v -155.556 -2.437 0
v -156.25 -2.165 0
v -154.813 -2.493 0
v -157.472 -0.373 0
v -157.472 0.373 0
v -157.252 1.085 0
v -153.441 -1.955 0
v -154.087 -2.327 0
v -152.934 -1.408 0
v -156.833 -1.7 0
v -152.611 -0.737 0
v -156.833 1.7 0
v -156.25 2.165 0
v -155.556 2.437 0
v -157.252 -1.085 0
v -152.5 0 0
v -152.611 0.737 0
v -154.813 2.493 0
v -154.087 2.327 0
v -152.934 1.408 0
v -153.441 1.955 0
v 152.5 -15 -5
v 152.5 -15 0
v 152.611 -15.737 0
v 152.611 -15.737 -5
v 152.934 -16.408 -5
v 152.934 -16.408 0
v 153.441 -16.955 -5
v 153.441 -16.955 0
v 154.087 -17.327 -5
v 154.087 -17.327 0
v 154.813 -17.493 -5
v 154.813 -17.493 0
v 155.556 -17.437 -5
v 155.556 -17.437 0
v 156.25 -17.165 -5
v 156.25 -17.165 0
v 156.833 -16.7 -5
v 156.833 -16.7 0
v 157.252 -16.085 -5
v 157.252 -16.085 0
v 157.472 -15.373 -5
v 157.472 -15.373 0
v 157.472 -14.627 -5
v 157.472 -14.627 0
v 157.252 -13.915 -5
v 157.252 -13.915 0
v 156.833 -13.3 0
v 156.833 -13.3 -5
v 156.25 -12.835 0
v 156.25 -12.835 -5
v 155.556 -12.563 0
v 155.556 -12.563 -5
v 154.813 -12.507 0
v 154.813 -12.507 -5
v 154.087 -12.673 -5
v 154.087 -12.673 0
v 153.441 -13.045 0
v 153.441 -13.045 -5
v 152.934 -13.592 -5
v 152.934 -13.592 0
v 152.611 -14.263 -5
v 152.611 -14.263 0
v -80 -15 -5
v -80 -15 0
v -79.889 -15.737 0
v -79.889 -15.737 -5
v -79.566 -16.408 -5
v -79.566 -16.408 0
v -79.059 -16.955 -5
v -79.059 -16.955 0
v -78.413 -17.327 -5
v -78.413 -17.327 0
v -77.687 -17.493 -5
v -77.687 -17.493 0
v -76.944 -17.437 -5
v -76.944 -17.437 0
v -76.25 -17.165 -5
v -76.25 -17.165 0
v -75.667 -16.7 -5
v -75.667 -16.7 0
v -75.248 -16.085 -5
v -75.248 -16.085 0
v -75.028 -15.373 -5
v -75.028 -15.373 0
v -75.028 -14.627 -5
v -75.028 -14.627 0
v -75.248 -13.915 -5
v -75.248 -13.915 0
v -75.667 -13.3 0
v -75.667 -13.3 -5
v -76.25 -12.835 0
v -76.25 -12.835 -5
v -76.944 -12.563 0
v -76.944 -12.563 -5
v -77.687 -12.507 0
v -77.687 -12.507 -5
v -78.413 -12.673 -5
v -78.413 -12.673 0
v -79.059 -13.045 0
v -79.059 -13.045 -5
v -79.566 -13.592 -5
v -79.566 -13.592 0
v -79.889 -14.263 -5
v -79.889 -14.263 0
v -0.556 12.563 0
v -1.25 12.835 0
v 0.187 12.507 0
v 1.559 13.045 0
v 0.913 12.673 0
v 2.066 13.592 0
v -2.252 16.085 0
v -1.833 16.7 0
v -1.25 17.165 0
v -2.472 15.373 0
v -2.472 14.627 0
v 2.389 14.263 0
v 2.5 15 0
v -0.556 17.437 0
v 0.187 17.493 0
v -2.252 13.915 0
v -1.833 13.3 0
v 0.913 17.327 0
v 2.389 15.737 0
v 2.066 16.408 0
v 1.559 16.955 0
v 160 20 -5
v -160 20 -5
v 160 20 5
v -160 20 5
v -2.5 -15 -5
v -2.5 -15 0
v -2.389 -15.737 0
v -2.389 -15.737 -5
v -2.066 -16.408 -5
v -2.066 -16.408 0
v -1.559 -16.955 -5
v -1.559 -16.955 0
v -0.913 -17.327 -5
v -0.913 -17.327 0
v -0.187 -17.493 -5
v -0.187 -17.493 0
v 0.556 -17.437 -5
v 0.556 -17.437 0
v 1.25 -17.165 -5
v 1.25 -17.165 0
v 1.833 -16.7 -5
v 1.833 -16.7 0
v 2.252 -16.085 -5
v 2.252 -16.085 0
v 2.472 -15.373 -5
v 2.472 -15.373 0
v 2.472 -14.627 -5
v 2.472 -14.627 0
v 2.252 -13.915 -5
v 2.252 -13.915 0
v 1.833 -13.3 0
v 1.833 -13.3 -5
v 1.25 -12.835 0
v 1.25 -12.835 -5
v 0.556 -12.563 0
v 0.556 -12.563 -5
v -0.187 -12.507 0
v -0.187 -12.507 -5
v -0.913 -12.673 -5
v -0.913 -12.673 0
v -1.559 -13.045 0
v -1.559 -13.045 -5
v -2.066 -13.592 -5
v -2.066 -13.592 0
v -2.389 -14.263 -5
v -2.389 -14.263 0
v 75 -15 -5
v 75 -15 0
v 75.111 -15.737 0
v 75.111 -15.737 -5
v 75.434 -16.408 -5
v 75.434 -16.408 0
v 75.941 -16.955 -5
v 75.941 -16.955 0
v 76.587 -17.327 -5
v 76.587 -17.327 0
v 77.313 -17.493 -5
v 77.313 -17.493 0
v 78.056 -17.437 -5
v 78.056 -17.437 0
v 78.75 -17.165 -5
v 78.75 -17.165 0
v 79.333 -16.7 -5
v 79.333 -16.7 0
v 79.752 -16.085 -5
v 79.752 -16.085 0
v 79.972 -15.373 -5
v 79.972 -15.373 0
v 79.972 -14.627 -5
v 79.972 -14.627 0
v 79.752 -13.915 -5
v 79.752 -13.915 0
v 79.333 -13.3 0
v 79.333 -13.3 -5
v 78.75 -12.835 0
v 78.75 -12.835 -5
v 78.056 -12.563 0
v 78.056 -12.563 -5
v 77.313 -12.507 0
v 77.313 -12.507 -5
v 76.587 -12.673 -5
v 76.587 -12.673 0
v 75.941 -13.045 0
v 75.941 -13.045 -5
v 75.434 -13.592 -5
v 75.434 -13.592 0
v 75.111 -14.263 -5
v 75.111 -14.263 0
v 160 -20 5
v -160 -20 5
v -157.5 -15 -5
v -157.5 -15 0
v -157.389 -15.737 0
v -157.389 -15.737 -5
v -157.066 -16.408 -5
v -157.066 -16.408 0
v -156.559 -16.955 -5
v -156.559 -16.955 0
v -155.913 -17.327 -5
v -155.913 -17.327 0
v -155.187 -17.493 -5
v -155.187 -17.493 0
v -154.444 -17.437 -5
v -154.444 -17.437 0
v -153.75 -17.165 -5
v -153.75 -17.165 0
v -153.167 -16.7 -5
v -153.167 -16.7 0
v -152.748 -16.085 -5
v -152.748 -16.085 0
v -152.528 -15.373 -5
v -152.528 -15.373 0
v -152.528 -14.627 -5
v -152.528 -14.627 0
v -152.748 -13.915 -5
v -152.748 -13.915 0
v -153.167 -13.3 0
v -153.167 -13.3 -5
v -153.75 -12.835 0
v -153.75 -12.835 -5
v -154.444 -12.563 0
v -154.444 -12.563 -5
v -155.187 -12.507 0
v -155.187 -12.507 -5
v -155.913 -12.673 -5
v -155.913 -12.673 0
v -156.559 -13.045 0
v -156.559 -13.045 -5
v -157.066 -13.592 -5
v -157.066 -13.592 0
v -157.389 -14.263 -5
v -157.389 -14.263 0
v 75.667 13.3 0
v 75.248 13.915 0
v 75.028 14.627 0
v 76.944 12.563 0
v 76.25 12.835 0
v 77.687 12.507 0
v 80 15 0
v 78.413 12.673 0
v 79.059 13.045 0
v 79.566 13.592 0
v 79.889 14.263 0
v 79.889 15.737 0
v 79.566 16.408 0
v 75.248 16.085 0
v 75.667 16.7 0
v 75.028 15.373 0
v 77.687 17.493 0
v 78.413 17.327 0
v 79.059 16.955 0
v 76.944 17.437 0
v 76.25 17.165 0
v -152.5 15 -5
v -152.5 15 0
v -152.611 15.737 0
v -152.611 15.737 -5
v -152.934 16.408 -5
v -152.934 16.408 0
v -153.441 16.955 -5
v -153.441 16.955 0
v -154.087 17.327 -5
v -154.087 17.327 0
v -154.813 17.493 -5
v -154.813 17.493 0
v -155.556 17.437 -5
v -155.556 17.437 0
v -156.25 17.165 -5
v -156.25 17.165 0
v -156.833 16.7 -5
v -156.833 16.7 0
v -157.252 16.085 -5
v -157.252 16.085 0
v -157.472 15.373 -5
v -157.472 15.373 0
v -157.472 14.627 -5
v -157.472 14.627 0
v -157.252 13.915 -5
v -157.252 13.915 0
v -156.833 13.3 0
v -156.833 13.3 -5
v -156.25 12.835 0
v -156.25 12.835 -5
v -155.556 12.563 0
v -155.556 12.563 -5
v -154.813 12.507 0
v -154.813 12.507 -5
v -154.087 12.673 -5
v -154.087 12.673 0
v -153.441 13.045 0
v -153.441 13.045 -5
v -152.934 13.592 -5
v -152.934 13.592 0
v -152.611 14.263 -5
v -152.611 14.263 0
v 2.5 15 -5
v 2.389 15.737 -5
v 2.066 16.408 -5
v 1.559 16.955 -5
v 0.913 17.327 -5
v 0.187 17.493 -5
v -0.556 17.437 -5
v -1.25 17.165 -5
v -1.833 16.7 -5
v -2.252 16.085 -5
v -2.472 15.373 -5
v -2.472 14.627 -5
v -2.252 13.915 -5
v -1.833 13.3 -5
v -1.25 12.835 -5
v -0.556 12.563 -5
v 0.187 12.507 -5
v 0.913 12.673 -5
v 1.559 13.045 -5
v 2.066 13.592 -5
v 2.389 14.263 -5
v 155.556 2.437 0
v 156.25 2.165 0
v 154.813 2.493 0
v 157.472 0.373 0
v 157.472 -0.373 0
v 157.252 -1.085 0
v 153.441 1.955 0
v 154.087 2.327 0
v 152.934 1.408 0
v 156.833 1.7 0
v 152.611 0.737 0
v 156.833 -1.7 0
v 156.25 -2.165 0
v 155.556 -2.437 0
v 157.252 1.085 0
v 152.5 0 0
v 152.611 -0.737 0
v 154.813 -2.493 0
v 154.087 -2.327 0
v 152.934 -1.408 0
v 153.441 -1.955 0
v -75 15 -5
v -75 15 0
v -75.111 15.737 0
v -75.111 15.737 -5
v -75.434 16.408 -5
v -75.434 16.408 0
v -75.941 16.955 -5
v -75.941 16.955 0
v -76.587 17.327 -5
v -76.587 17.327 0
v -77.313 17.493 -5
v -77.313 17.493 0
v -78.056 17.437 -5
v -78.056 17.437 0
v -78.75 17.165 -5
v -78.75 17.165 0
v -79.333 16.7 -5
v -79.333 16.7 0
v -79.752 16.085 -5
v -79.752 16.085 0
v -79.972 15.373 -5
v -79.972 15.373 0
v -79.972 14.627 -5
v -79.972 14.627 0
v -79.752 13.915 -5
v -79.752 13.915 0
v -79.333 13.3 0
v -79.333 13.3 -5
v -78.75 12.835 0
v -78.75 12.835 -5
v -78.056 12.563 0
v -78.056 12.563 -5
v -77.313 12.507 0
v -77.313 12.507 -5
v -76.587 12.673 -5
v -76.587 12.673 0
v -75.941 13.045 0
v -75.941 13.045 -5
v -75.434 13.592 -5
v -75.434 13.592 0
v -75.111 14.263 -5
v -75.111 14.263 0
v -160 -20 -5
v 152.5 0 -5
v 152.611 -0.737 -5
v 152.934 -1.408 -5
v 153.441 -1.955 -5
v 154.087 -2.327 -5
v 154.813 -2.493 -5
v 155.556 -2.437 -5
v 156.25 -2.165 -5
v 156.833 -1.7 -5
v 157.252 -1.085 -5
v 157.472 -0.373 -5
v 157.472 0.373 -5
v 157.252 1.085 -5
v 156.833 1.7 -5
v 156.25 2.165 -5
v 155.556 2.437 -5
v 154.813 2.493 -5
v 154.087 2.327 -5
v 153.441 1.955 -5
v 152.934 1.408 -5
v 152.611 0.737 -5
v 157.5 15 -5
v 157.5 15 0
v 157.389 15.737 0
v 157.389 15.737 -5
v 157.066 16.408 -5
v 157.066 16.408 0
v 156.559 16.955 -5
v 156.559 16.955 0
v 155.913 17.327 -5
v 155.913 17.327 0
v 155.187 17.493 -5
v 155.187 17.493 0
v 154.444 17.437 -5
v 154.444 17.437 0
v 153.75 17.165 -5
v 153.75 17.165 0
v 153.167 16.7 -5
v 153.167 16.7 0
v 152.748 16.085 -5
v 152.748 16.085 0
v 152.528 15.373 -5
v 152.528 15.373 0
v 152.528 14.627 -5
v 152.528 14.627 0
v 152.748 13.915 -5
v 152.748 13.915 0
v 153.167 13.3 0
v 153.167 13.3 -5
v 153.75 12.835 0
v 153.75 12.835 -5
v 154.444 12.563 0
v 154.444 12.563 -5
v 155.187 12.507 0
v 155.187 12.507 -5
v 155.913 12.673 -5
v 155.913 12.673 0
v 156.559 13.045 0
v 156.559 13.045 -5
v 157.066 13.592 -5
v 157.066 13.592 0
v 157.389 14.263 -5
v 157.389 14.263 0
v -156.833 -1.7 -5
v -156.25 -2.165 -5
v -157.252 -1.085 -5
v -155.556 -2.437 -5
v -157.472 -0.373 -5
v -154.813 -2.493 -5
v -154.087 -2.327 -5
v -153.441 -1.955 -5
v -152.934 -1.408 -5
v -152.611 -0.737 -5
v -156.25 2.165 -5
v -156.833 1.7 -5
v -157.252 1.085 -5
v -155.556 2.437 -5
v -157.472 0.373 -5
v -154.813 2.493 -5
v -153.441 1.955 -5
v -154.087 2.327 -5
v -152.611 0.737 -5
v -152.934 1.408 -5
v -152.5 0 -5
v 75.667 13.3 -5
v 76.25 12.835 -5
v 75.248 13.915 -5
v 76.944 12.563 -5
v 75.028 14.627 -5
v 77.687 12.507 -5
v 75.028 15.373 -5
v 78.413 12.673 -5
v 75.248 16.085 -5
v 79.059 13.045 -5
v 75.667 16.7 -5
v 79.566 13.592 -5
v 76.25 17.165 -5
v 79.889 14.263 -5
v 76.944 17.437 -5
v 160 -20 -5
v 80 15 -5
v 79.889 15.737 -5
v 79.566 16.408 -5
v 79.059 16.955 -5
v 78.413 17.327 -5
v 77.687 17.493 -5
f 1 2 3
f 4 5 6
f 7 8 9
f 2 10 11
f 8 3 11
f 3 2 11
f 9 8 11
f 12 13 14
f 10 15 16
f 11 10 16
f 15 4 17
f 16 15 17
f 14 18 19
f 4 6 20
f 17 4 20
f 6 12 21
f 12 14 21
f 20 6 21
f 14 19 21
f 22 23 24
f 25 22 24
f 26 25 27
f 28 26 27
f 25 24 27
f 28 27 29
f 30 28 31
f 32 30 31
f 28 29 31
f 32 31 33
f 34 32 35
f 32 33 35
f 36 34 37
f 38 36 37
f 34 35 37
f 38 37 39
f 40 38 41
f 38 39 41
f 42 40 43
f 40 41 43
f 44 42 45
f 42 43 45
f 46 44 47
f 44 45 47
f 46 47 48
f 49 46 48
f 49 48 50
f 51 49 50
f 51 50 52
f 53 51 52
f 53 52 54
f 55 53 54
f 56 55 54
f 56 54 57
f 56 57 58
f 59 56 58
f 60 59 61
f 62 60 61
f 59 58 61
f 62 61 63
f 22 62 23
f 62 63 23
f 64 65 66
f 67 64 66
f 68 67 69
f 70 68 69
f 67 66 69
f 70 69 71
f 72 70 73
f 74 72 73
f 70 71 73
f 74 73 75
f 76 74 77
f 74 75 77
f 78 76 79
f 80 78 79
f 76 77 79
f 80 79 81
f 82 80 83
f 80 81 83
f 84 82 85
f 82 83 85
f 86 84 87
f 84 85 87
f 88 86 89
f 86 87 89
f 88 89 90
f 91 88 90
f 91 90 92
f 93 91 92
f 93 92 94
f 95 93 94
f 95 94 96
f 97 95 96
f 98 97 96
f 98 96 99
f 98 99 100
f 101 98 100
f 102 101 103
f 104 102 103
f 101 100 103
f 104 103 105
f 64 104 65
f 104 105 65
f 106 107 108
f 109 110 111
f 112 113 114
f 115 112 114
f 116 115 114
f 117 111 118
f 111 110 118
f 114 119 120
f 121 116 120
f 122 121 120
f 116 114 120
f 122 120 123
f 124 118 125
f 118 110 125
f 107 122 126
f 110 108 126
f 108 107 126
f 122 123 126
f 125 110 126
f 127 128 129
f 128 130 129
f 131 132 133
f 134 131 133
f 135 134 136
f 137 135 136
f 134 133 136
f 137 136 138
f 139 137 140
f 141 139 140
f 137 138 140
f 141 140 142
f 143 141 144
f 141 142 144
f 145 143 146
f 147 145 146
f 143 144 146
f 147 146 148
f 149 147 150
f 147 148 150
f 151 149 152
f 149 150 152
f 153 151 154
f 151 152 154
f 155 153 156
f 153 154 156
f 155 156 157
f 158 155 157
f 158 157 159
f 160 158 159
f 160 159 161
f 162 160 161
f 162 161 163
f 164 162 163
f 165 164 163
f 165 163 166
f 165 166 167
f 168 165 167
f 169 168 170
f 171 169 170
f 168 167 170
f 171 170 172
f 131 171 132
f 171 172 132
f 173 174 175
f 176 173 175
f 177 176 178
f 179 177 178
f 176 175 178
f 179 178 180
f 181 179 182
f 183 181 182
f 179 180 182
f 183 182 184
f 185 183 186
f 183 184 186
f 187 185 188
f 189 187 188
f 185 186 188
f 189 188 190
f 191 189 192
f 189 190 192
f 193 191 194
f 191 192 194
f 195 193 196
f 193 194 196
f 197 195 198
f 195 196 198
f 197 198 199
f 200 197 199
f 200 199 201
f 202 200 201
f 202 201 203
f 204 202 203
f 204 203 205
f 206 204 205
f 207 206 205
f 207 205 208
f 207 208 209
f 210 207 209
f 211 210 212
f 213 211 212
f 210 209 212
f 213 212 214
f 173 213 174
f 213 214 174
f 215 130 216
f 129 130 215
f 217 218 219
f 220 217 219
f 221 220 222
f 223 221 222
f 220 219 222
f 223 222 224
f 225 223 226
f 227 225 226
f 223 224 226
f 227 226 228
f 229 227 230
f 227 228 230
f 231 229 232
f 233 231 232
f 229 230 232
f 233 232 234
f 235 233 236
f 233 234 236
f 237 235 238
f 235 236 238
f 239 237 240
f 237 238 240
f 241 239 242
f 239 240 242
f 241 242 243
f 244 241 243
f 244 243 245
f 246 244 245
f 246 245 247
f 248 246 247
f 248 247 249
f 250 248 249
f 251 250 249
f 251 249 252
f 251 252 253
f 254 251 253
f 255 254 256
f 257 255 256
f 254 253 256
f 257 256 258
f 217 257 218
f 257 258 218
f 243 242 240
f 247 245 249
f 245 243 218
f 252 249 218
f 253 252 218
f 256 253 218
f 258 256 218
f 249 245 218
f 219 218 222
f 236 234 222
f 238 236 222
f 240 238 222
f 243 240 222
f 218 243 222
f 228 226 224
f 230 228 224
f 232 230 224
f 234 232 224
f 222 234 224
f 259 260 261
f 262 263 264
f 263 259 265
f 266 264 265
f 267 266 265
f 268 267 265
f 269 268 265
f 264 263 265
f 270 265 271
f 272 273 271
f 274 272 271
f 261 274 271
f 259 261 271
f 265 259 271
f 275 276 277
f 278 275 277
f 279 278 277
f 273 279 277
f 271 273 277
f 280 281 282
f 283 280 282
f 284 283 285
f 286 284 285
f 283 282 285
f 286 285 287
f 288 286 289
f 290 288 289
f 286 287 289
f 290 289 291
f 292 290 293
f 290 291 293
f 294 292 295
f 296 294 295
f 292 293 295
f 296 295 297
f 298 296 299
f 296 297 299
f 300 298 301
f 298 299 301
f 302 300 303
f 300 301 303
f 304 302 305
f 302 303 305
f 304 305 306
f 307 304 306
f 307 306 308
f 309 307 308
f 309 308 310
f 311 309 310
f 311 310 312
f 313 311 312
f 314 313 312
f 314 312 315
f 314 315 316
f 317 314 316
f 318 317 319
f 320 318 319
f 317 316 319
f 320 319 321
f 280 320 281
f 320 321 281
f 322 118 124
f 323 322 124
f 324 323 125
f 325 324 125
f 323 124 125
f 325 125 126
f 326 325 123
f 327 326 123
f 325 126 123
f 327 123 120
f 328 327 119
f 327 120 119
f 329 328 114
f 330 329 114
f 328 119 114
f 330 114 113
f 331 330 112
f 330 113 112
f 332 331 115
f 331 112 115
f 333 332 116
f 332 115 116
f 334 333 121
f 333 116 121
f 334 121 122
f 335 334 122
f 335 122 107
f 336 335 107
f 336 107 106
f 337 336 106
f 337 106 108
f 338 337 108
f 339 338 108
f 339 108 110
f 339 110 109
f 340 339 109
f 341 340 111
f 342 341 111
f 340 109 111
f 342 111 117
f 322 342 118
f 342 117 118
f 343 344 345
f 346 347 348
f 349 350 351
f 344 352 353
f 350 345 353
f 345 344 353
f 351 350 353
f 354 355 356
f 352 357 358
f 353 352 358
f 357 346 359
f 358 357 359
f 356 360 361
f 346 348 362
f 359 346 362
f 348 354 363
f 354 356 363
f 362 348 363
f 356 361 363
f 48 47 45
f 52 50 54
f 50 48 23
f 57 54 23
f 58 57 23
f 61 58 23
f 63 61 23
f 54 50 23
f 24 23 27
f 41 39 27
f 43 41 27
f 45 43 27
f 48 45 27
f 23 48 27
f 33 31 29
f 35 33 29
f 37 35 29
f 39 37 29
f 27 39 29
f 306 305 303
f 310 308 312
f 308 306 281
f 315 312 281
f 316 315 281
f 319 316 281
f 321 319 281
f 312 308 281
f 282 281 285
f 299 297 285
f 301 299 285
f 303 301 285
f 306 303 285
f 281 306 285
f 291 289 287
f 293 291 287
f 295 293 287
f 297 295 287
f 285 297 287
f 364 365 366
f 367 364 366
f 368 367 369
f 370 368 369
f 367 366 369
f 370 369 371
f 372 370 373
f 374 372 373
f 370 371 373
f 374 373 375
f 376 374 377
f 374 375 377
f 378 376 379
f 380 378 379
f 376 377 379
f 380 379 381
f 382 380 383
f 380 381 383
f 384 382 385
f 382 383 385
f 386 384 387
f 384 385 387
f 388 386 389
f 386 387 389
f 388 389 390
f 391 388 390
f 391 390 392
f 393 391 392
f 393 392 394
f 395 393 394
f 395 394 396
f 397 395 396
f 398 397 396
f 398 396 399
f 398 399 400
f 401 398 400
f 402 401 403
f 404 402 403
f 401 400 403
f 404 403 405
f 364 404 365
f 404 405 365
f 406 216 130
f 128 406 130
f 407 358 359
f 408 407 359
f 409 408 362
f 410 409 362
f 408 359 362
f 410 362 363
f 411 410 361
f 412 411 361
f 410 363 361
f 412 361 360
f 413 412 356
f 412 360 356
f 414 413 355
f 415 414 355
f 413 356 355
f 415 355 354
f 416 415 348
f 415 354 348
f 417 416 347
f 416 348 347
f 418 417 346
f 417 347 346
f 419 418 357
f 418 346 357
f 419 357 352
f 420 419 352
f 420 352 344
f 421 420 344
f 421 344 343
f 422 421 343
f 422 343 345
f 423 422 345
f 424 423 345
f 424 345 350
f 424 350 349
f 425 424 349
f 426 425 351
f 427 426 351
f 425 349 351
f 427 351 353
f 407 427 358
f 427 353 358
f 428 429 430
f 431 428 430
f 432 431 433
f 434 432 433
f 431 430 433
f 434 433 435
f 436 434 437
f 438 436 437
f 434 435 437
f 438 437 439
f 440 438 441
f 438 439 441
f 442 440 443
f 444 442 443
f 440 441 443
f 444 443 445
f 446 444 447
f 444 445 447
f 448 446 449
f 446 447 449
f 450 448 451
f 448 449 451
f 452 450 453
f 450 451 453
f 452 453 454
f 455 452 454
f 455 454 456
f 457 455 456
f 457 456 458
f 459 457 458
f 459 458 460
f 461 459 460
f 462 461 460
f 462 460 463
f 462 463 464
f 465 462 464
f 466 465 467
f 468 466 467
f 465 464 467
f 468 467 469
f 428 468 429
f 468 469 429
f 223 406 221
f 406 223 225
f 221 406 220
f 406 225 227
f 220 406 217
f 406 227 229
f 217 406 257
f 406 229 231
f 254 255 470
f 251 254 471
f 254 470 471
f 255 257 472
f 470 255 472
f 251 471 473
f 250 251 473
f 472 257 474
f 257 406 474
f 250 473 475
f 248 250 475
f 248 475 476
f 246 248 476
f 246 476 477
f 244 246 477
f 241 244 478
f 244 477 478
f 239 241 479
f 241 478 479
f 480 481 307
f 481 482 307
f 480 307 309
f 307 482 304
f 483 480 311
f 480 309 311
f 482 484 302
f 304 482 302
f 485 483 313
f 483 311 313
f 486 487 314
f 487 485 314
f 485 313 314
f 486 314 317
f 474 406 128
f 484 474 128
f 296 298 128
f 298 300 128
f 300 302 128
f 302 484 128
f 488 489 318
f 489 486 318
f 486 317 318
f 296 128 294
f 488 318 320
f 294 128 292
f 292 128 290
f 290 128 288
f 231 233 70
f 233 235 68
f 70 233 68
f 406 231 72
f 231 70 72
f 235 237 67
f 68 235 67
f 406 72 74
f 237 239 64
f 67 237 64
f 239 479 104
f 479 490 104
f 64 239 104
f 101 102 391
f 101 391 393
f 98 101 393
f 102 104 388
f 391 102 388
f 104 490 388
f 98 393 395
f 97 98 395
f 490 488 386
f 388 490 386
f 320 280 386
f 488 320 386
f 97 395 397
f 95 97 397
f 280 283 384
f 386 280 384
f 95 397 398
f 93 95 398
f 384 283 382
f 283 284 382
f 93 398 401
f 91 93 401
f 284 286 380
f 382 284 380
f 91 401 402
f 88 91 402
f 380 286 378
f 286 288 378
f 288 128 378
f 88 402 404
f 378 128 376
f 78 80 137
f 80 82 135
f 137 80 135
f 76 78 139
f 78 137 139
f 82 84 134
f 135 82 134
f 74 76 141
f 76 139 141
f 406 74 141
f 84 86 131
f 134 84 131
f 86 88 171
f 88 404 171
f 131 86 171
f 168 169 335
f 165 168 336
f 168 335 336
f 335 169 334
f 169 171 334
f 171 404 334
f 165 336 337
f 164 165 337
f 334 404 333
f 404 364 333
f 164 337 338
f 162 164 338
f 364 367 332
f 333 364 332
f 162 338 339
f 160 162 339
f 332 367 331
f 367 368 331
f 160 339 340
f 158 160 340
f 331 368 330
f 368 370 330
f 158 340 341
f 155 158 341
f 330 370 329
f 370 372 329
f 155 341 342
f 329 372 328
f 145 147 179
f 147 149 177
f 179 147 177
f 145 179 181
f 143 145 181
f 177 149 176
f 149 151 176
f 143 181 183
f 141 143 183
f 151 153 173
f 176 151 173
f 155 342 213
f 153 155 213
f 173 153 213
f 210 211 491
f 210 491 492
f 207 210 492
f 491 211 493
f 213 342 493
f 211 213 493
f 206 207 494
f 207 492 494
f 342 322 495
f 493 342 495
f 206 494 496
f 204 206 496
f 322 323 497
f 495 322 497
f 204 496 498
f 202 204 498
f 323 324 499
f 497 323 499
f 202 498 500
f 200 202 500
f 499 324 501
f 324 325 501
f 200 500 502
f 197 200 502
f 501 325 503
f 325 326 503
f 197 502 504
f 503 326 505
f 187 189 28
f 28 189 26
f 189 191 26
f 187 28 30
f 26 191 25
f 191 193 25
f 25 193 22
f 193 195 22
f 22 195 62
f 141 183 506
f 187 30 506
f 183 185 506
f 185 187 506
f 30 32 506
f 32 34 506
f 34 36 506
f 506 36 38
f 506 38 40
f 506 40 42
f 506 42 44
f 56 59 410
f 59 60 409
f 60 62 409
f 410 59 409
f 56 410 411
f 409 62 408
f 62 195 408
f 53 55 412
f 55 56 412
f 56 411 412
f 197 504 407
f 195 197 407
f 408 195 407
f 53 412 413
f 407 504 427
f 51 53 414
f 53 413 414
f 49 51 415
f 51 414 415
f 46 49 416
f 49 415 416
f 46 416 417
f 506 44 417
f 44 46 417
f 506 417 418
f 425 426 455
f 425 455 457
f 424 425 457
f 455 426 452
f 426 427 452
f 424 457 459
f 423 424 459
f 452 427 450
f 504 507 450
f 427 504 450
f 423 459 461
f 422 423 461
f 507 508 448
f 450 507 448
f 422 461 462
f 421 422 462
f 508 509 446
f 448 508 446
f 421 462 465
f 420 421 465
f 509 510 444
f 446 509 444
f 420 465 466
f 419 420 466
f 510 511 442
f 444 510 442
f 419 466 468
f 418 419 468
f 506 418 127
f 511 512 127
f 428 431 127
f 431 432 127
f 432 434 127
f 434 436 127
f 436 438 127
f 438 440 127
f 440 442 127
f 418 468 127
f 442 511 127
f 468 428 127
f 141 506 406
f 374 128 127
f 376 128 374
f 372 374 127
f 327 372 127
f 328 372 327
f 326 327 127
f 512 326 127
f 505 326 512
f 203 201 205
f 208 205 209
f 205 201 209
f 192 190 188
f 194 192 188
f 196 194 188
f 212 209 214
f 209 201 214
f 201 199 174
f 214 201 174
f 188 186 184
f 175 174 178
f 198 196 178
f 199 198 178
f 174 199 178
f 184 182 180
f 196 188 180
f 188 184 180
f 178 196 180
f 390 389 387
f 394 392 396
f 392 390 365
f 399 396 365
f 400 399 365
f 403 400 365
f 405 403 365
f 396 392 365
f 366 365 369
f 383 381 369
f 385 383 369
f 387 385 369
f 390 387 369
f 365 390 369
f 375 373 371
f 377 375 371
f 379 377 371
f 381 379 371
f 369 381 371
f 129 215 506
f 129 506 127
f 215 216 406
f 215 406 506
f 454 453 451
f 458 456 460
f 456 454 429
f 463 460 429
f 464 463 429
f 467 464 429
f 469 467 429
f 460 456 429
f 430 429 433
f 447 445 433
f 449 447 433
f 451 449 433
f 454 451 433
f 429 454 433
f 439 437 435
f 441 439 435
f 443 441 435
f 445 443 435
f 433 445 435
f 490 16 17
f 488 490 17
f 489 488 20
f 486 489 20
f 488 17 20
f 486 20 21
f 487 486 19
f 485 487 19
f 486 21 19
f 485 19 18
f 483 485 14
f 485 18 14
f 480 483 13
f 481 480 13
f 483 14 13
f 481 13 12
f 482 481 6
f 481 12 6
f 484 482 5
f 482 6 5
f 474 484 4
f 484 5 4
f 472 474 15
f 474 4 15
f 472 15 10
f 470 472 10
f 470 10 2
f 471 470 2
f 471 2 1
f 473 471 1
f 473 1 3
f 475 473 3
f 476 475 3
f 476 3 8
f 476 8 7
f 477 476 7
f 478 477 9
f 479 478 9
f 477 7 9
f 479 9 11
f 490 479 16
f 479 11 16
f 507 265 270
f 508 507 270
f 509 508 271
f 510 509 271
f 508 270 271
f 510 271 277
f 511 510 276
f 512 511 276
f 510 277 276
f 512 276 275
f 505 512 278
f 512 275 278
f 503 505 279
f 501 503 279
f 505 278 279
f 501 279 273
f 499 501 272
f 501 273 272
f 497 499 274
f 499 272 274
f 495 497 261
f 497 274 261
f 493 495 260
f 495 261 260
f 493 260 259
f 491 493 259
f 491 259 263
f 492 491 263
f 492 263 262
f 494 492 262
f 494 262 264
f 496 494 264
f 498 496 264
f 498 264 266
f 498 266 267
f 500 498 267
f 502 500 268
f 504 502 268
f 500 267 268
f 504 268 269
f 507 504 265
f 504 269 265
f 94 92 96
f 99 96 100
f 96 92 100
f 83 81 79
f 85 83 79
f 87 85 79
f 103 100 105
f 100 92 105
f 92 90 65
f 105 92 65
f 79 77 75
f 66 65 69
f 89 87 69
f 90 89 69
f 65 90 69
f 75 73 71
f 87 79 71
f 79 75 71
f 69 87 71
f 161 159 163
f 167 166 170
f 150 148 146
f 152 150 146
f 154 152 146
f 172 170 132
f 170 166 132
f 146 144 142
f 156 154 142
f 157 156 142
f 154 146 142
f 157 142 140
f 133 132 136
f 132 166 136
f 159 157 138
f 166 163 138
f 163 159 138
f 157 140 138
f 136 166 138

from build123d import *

# Parameters (mm, degrees)
CROQUIS1_W              = 320
CROQUIS1_H              = 40
SALIENTE_EXTRUIR1_DEPTH = 5
CROQUIS2_R              = 2.5
CORTAR_EXTRUIR1_DEPTH   = 5


with BuildPart() as part:
    # Croquis1 → Saliente-Extruir1 (new, symmetric)
    with BuildSketch(Plane.XY):
        Rectangle(CROQUIS1_W, CROQUIS1_H)
    extrude(amount=SALIENTE_EXTRUIR1_DEPTH, both=True)

    # Croquis2 → Cortar-Extruir1 (cut)
    with BuildSketch(Plane.XY):
        with Locations((155, 15)):
            Circle(CROQUIS2_R)
        with Locations((77.5, 15)):
            Circle(CROQUIS2_R)
        with Locations((0, 15)):
            Circle(CROQUIS2_R)
        with Locations((-77.5, 15)):
            Circle(CROQUIS2_R)
        with Locations((-155, 15)):
            Circle(CROQUIS2_R)
        with Locations(Location((155, -15, 0), (0, 0, 180))):
            Circle(CROQUIS2_R)
        with Locations(Location((77.5, -15, 0), (0, 0, 180))):
            Circle(CROQUIS2_R)
        with Locations(Location((0, -15, 0), (0, 0, 180))):
            Circle(CROQUIS2_R)
        with Locations(Location((-77.5, -15, 0), (0, 0, 180))):
            Circle(CROQUIS2_R)
        with Locations(Location((-155, -15, 0), (0, 0, 180))):
            Circle(CROQUIS2_R)
        with Locations((-155, 0)):
            Circle(CROQUIS2_R)
        with Locations(Location((155, 0, 0), (0, 0, 180))):
            Circle(CROQUIS2_R)
    extrude(amount=-CORTAR_EXTRUIR1_DEPTH, mode=Mode.SUBTRACT)


solid = part.part
